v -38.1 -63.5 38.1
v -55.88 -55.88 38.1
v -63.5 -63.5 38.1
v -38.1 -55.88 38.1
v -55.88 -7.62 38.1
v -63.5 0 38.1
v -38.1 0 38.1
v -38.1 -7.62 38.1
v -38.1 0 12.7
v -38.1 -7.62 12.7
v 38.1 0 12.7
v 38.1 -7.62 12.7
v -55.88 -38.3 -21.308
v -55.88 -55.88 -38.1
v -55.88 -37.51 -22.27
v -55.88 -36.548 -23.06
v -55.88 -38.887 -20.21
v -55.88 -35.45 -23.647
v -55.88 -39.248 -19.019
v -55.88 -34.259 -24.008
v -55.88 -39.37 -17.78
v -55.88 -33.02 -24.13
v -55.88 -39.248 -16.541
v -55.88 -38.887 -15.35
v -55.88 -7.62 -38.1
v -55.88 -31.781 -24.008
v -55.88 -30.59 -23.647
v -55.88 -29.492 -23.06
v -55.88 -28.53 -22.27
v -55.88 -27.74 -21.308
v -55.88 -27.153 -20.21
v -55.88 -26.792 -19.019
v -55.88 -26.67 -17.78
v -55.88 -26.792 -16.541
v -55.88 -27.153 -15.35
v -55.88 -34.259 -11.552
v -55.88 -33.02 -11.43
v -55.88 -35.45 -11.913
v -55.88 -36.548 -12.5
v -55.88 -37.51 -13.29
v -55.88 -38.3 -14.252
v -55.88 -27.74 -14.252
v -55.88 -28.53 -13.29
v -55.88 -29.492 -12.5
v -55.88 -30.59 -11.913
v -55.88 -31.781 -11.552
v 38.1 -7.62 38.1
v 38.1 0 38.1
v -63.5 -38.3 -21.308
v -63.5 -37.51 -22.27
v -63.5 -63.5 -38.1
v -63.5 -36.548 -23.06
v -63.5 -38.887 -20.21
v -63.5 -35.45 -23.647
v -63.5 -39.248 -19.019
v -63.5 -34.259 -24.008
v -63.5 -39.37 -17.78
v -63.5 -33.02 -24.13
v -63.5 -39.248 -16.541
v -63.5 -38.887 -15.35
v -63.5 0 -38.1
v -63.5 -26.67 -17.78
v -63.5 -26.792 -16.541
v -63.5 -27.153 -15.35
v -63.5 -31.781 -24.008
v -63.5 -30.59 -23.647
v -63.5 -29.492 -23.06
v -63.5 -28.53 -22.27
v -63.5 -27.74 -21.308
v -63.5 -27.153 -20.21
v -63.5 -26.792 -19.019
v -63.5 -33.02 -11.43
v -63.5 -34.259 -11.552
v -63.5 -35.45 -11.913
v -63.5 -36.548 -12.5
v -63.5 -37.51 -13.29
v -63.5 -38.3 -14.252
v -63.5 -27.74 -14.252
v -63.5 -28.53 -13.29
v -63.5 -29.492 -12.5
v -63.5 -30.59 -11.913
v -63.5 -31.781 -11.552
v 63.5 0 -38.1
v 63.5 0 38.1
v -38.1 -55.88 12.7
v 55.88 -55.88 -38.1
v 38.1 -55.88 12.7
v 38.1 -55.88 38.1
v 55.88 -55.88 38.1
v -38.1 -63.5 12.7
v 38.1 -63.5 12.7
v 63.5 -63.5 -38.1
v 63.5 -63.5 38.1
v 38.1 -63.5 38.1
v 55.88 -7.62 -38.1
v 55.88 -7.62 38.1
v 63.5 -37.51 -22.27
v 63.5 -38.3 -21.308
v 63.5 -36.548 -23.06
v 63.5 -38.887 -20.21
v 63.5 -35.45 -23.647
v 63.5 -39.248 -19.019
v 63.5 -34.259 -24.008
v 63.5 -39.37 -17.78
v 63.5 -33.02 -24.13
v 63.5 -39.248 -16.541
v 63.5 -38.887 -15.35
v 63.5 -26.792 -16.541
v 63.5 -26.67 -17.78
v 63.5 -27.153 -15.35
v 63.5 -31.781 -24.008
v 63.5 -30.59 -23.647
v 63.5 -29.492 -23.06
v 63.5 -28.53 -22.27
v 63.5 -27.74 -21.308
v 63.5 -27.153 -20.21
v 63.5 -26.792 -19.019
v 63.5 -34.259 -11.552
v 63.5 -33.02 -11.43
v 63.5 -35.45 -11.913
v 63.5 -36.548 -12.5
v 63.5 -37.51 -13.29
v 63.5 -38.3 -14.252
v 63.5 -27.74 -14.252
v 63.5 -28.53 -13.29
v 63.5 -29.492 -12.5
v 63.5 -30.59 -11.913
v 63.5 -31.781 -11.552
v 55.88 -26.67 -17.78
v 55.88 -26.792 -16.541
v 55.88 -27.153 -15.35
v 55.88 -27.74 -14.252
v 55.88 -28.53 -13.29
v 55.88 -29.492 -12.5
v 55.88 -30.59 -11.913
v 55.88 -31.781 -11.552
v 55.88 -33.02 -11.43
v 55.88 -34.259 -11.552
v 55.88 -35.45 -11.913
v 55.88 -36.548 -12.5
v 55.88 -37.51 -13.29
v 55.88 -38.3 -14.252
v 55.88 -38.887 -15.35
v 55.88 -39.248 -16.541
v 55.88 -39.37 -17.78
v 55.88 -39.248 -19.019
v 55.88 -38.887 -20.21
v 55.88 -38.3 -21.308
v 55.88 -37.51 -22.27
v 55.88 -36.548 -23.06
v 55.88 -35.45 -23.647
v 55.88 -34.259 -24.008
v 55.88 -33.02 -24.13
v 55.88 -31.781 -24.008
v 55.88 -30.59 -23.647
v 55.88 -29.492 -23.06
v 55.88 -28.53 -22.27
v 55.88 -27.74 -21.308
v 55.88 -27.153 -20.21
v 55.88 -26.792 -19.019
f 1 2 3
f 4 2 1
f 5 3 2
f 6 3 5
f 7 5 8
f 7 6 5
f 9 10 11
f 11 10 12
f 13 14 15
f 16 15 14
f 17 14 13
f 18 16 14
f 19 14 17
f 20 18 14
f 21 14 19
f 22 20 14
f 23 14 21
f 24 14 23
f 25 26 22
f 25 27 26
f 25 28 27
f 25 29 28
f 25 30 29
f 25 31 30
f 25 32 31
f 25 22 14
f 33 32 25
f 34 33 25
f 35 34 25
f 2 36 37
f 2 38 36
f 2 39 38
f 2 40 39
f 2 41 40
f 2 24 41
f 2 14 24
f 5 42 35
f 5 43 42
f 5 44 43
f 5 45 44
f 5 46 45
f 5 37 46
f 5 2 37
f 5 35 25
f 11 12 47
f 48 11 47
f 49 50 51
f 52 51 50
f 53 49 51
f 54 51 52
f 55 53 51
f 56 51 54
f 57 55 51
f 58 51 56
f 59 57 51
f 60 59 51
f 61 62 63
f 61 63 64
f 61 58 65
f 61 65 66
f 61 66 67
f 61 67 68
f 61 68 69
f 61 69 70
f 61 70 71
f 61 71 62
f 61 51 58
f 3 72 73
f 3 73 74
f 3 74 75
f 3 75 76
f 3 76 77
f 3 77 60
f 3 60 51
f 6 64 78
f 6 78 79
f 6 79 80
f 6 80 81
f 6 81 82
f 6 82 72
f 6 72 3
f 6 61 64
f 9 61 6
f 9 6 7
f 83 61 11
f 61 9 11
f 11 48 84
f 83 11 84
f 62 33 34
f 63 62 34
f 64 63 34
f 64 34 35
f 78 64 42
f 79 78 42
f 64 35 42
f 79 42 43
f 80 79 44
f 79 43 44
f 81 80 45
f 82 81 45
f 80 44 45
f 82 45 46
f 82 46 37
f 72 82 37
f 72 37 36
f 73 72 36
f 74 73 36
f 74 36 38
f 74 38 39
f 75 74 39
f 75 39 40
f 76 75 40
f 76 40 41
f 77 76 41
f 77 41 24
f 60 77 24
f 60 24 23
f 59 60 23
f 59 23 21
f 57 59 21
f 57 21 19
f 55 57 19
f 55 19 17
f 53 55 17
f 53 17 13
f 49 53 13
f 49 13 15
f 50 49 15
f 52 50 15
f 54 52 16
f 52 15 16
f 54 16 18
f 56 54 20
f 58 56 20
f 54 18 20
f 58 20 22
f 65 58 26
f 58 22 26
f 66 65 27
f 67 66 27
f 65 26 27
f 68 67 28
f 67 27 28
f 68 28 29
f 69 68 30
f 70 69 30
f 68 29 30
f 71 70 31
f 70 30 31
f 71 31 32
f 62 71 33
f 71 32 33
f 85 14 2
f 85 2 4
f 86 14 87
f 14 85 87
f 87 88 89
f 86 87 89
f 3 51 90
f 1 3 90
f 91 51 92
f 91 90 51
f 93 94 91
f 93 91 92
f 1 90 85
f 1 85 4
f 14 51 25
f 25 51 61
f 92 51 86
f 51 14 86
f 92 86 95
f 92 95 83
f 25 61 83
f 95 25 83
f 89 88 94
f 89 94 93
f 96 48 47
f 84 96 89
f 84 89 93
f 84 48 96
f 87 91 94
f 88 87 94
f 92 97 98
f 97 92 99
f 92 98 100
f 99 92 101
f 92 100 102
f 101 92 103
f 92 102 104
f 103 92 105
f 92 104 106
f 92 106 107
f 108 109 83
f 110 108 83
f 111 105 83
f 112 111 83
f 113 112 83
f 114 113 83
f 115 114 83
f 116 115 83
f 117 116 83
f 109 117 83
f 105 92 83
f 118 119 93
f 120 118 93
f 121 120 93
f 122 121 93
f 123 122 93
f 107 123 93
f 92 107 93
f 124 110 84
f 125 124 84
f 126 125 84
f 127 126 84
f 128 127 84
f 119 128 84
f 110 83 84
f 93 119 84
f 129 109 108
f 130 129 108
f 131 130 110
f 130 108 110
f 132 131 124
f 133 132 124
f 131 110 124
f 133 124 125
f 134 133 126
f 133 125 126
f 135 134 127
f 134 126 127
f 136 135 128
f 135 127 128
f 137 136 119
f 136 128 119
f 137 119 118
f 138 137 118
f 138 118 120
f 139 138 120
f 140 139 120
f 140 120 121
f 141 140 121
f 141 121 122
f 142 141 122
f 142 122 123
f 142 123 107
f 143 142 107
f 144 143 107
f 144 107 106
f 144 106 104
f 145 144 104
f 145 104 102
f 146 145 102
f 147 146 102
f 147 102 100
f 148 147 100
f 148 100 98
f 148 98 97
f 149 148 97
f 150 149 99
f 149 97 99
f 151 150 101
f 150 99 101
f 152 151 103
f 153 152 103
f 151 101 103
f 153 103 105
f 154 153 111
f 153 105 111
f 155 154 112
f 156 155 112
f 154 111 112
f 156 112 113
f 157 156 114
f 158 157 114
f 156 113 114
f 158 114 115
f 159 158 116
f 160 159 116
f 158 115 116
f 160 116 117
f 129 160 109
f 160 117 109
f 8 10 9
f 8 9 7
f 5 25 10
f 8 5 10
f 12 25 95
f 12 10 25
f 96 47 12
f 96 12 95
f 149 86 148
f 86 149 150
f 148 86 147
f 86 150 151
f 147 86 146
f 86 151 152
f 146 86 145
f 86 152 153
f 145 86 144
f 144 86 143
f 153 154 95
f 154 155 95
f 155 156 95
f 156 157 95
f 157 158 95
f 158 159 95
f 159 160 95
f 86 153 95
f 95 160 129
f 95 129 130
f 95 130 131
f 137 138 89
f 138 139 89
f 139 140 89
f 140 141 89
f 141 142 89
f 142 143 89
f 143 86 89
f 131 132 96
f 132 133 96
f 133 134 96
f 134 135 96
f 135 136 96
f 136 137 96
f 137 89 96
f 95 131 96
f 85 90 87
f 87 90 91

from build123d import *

# Parameters (mm, degrees)
F0_W     = 127
F0_H     = 76.2
F1_DEPTH = 63.5
F2_W     = 76.2
F2_H     = 25.4
F3_DEPTH = 75.184
F4_W     = 111.76
F4_H     = 48.26
F5_DEPTH = 86.868
F6_R     = 6.35
F7_DEPTH = 142.748


with BuildPart() as f1:
    # F0 (on Front) → F1 (new body)
    with BuildSketch(Plane.XZ):
        Rectangle(F0_W, F0_H)
    extrude(amount=F1_DEPTH)

    # F2 (on face) → F3 (cut)
    with BuildSketch(Plane.XZ.offset(63.5)):
        with Locations((0, 25.4)):
            Rectangle(F2_W, F2_H)
    extrude(amount=-F3_DEPTH, mode=Mode.SUBTRACT)

    # F4 (on face) → F5 (cut)
    with BuildSketch(Plane.XY.offset(38.1)):
        with Locations((0, -31.75)):
            Rectangle(F4_W, F4_H)
    extrude(amount=-F5_DEPTH, mode=Mode.SUBTRACT)

    # F6 (on face) → F7 (cut)
    with BuildSketch(Plane.YZ.offset(63.5)):
        with Locations((-33.02, -17.78)):
            Circle(F6_R)
    extrude(amount=-F7_DEPTH, mode=Mode.SUBTRACT)


solid = f1.part
